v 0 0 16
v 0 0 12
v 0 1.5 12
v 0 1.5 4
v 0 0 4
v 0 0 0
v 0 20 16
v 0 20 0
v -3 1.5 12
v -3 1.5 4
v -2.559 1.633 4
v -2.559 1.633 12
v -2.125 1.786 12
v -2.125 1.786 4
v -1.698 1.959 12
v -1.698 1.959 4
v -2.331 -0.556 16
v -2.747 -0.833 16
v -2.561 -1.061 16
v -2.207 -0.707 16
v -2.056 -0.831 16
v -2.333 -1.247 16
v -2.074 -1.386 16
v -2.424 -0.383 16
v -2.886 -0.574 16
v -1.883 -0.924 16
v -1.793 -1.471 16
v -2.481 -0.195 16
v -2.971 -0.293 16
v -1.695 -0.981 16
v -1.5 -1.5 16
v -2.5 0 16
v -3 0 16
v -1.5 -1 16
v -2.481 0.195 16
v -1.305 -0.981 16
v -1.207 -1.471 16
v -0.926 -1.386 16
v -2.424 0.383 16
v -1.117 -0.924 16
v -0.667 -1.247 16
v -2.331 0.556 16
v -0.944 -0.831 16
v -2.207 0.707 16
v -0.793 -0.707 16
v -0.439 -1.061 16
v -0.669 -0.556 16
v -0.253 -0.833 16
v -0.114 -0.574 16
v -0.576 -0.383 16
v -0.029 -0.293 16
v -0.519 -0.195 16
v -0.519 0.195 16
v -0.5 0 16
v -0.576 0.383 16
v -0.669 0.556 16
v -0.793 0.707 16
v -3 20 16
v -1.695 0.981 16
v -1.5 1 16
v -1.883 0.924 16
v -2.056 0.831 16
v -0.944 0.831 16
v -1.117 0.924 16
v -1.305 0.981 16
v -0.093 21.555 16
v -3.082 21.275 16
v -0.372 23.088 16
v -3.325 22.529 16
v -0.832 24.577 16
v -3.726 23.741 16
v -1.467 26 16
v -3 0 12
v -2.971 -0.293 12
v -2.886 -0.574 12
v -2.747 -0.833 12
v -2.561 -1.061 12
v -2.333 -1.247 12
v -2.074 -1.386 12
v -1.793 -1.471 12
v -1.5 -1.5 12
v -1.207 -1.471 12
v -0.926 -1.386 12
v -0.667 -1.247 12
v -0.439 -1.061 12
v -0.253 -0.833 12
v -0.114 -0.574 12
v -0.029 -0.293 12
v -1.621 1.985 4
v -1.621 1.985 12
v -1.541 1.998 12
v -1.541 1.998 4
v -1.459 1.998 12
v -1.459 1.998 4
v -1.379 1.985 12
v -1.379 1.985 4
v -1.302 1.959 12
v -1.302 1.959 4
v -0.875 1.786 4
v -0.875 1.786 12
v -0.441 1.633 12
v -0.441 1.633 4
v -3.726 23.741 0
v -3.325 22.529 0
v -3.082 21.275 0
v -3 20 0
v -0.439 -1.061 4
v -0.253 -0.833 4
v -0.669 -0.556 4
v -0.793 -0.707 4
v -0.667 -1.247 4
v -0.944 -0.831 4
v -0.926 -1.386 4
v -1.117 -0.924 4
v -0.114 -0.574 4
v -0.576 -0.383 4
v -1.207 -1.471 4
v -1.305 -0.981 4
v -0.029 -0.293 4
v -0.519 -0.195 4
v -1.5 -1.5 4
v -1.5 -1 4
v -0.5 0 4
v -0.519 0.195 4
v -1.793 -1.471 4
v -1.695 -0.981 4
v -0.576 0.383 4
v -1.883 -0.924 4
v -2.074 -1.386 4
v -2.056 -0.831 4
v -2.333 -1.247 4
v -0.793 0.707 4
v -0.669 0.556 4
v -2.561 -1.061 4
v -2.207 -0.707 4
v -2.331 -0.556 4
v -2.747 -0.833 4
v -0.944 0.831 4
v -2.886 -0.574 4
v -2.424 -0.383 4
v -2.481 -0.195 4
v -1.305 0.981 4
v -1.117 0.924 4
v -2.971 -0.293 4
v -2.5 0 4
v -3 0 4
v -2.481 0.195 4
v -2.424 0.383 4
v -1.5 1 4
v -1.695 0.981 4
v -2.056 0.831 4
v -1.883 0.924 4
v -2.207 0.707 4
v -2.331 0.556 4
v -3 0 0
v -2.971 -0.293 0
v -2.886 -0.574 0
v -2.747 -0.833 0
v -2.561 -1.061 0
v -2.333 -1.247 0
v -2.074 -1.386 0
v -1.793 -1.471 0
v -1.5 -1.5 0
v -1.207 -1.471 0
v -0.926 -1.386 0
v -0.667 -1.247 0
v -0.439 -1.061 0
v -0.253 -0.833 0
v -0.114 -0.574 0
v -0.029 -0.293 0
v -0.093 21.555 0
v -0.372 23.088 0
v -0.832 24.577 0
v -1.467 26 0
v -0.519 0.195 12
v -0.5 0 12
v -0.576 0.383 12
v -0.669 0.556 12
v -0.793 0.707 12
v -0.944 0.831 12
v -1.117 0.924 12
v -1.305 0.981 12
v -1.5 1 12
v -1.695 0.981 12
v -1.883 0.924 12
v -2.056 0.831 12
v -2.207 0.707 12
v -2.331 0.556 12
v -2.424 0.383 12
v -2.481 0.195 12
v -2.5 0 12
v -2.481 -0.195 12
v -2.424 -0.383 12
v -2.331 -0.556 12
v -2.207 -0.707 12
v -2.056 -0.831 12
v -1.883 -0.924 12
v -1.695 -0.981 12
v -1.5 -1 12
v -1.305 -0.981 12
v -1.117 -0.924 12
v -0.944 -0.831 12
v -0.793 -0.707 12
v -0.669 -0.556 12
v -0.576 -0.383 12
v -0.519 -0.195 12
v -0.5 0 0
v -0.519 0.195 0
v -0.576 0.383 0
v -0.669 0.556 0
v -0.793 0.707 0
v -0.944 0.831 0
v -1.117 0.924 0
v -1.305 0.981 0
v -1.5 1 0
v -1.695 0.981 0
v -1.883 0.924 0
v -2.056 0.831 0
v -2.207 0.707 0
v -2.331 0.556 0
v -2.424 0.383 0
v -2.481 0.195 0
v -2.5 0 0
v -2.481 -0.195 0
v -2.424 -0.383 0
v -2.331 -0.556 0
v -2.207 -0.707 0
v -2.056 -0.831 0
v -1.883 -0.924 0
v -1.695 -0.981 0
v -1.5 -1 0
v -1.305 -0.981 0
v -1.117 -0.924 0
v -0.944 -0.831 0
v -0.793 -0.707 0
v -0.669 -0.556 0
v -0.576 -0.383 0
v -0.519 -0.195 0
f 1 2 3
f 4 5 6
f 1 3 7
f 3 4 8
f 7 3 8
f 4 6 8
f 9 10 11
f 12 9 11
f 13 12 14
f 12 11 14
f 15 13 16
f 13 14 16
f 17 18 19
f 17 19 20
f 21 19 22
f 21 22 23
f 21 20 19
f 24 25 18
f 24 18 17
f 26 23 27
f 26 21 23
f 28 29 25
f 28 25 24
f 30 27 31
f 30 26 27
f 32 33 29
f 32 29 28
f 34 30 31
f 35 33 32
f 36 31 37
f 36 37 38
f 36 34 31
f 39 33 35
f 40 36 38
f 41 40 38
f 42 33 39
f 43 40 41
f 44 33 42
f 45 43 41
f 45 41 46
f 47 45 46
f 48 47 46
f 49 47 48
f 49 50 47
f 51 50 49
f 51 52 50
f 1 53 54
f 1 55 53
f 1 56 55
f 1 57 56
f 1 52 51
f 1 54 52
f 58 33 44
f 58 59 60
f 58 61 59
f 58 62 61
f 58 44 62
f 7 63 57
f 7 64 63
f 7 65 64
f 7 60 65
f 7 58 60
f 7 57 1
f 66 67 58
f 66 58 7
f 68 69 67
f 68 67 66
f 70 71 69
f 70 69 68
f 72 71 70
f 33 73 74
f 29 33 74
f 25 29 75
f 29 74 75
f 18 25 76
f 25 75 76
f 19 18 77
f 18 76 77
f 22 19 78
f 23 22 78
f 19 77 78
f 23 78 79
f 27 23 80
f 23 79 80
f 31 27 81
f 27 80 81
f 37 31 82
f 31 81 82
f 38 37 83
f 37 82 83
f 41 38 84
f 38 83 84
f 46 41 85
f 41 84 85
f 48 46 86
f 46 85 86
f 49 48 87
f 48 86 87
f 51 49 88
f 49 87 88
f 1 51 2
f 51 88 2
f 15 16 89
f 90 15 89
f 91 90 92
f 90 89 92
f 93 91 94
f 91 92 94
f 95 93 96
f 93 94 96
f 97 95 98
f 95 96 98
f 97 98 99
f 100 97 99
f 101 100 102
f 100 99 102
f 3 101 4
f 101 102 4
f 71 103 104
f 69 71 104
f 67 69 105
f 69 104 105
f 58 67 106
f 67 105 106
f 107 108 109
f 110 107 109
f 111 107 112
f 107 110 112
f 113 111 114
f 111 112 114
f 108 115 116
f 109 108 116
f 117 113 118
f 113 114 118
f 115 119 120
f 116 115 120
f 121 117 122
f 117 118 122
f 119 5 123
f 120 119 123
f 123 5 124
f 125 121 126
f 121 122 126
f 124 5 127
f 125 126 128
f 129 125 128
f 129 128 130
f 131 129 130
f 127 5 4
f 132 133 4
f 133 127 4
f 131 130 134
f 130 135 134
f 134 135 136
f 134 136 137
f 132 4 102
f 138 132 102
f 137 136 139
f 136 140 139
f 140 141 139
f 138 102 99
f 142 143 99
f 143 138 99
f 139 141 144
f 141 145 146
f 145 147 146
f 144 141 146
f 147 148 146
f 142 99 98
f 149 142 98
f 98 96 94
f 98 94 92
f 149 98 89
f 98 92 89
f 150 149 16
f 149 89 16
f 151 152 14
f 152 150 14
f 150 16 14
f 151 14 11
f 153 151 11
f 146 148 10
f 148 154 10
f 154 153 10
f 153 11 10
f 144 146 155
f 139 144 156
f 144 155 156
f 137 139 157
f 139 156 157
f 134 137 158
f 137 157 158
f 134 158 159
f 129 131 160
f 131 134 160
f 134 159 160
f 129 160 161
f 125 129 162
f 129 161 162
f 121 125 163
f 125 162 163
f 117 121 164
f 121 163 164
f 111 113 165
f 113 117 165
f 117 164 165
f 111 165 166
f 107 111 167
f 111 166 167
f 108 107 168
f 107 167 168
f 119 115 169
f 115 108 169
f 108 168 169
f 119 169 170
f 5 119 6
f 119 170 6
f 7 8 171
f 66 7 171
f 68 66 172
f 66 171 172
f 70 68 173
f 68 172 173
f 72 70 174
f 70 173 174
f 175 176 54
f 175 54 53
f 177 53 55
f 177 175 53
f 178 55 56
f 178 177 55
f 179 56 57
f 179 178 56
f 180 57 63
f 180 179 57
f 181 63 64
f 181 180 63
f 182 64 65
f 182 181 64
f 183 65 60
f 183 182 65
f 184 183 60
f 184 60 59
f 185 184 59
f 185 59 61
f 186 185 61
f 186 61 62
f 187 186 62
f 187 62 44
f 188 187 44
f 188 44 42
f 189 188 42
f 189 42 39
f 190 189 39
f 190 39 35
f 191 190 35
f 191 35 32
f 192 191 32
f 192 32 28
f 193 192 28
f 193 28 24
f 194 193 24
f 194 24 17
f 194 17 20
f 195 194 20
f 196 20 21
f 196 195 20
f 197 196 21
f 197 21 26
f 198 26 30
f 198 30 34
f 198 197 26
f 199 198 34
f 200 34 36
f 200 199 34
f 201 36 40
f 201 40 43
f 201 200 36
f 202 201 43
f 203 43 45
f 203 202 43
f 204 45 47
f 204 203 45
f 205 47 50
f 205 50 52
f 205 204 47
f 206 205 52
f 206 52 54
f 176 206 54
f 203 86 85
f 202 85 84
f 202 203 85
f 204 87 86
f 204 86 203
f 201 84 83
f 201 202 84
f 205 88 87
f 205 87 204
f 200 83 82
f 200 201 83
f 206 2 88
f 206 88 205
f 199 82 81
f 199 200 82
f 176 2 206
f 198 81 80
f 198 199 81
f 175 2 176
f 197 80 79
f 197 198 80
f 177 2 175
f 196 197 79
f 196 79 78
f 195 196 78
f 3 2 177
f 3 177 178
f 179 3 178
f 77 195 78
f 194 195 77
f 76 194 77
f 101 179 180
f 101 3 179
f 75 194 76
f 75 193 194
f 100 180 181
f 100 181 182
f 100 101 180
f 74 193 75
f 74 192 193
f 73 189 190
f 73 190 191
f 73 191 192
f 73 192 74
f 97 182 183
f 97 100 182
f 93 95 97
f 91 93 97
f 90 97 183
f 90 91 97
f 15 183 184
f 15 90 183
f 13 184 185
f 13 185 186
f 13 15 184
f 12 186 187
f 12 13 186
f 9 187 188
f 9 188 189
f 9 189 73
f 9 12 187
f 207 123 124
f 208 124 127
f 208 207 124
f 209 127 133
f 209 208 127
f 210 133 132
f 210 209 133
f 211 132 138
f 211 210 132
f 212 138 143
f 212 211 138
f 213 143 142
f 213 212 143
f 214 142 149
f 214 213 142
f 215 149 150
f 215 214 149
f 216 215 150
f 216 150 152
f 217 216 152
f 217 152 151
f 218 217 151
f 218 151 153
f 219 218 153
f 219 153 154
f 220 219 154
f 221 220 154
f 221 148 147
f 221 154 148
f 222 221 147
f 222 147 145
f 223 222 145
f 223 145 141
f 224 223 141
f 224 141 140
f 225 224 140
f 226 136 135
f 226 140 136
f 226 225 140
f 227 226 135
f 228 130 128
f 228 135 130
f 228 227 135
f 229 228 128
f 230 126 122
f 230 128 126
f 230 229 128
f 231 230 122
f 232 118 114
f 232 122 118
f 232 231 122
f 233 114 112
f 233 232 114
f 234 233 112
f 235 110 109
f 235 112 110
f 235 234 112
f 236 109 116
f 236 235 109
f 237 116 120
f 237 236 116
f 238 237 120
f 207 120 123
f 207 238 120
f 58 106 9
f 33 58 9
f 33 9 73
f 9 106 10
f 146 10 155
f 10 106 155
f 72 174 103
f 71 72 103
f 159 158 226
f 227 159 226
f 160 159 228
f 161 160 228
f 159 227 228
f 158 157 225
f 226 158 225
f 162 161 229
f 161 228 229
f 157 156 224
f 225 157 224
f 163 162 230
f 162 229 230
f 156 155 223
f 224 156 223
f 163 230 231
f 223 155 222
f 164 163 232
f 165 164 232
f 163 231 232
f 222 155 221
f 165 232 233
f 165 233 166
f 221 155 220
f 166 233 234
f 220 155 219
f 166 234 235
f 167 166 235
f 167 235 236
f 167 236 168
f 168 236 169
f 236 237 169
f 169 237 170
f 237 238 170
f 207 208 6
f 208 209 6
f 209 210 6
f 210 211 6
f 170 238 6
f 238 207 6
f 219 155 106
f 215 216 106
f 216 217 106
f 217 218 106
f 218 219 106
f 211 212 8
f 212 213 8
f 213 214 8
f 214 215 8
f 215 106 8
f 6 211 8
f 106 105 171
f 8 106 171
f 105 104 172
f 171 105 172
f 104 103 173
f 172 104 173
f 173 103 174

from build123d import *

# Parameters (mm, degrees)
SKETCH1_R           = 1
BOSS_EXTRUDE1_DEPTH = 16
CUT_EXTRUDE1_START  = 8
SKETCH4_R           = 0.5
SKETCH4_R_2         = 1
CUT_EXTRUDE1_DEPTH  = 8
FILLET1_R           = 10


with BuildPart() as part:
    # Sketch1 → Boss-Extrude1 (new body)
    with BuildSketch(Plane.XY):
        with BuildLine():
            ThreePointArc((0, 20), (-0.37218717, 23.088420816), (-1.467437405, 26))
            Line((-1.467437405, 26), (-3.726208596, 23.741228809))
            ThreePointArc((-3.726208596, 23.741228809), (-3.183230826, 21.90552958), (-3, 20))
            Line((-3, 20), (-3, 0))
            ThreePointArc((-3, 0), (-1.5, -1.5), (0, 0))
            Line((0, 0), (0, 20))
        make_face()
        with Locations((-1.5, 0)):
            Circle(SKETCH1_R, mode=Mode.SUBTRACT)
    extrude(amount=BOSS_EXTRUDE1_DEPTH)

    # Sketch4 → Cut-Extrude1 (cut)
    # profile 1 of 10: a face of its own
    with BuildSketch(Plane(origin=(0, 0, 12), x_dir=(-1, 0, 0), z_dir=(0, 0, -1)).offset(CUT_EXTRUDE1_START)):
        with Locations((1.5, 1.5)):
            Circle(SKETCH4_R)
    # profile 2 of 10: a face of its own
    with BuildSketch(Plane(origin=(0, 0, 12), x_dir=(-1, 0, 0), z_dir=(0, 0, -1)).offset(CUT_EXTRUDE1_START)):
        with BuildLine():
            ThreePointArc((3, 0), (1.5, 1.5), (0, 0))
            ThreePointArc((0, 0), (1.5, -1.5), (3, 0))
        make_face()
        with Locations((1.5, 0)):
            Circle(SKETCH4_R_2, mode=Mode.SUBTRACT)
    # profile 3 of 10: a face of its own
    with BuildSketch(Plane(origin=(0, 0, 12), x_dir=(-1, 0, 0), z_dir=(0, 0, -1)).offset(CUT_EXTRUDE1_START)):
        with BuildLine():
            ThreePointArc((1.993006649, 1.416666667), (2.722601728, 0.869048338), (3, 0))
            Line((3, 0), (3, 1.5))
            Line((3, 1.5), (2, 1.5))
            ThreePointArc((2, 1.5), (1.998248595, 1.45818687), (1.993006649, 1.416666667))
        make_face()
    # profile 4 of 10: a face of its own
    with BuildSketch(Plane(origin=(0, 0, 12), x_dir=(-1, 0, 0), z_dir=(0, 0, -1)).offset(CUT_EXTRUDE1_START)):
        with BuildLine():
            ThreePointArc((1.5, 1.5), (1.25, 1.479019946), (1.006993351, 1.416666667))
            ThreePointArc((1.006993351, 1.416666667), (1.177251388, 1.118118692), (1.5, 1))
            ThreePointArc((1.5, 1), (1.822748612, 1.118118692), (1.993006649, 1.416666667))
            ThreePointArc((1.993006649, 1.416666667), (1.75, 1.479019946), (1.5, 1.5))
        make_face()
    # profile 5 of 10: a face of its own
    with BuildSketch(Plane(origin=(0, 0, 12), x_dir=(-1, 0, 0), z_dir=(0, 0, -1)).offset(CUT_EXTRUDE1_START)):
        with BuildLine():
            Line((0, 1.5), (0, 0))
            ThreePointArc((0, 0), (0.277398272, 0.869048338), (1.006993351, 1.416666667))
            ThreePointArc((1.006993351, 1.416666667), (1.001751405, 1.45818687), (1, 1.5))
            Line((1, 1.5), (0, 1.5))
        make_face()
    # profile 6 of 10: a face of its own
    with BuildSketch(Plane(origin=(0, 0, 12), x_dir=(-1, 0, 0), z_dir=(0, 0, -1)).offset(CUT_EXTRUDE1_START)):
        with BuildLine():
            ThreePointArc((1, 1.5), (1.001751405, 1.45818687), (1.006993351, 1.416666667))
            ThreePointArc((1.006993351, 1.416666667), (1.25, 1.479019946), (1.5, 1.5))
            Line((1.5, 1.5), (1, 1.5))
        make_face()
    # profile 7 of 10: a face of its own
    with BuildSketch(Plane(origin=(0, 0, 12), x_dir=(-1, 0, 0), z_dir=(0, 0, -1)).offset(CUT_EXTRUDE1_START)):
        with BuildLine():
            ThreePointArc((1.5, 1.5), (1.75, 1.479019946), (1.993006649, 1.416666667))
            ThreePointArc((1.993006649, 1.416666667), (1.998248595, 1.45818687), (2, 1.5))
            Line((2, 1.5), (1.5, 1.5))
        make_face()
    # profile 8 of 10: a face of its own
    with BuildSketch(Plane(origin=(0, 0, 12), x_dir=(-1, 0, 0), z_dir=(0, 0, -1)).offset(CUT_EXTRUDE1_START)):
        with BuildLine():
            ThreePointArc((2, 1.5), (1.5, 2), (1, 1.5))
            Line((1, 1.5), (1.5, 1.5))
            Line((1.5, 1.5), (2, 1.5))
        make_face()
    # profile 9 of 10: a face of its own
    with BuildSketch(Plane(origin=(0, 0, 12), x_dir=(-1, 0, 0), z_dir=(0, 0, -1)).offset(CUT_EXTRUDE1_START)):
        with BuildLine():
            ThreePointArc((1, 1.5), (1.001751405, 1.45818687), (1.006993351, 1.416666667))
            ThreePointArc((1.006993351, 1.416666667), (1.25, 1.479019946), (1.5, 1.5))
            Line((1.5, 1.5), (1, 1.5))
        make_face()
    # profile 10 of 10: a face of its own
    with BuildSketch(Plane(origin=(0, 0, 12), x_dir=(-1, 0, 0), z_dir=(0, 0, -1)).offset(CUT_EXTRUDE1_START)):
        with BuildLine():
            ThreePointArc((1.5, 1.5), (1.75, 1.479019946), (1.993006649, 1.416666667))
            ThreePointArc((1.993006649, 1.416666667), (1.998248595, 1.45818687), (2, 1.5))
            Line((2, 1.5), (1.5, 1.5))
        make_face()
    extrude(amount=-CUT_EXTRUDE1_DEPTH, mode=Mode.SUBTRACT)

    # Fillet1
    # the kernel refuses this fillet: 10 mm, written as the material it takes off along each edge
    with BuildSketch(Plane(origin=(-2, 1.5, 4), x_dir=(-1, 0, 0), z_dir=(0, 0, 1))) as fillet1_piece_1:
        with BuildLine():
            CenterArc((3.666666667, -9.637888197), FILLET1_R, 105.466009953, 7.913858162)
            Line((-0.301587302, -0.458947057), (-0.380952381, -0.275368234))
            ThreePointArc((-0.380952381, -0.275368234), (-0.249286732, -0.164750894), (-0.2, 0))
            Line((-0.2, 0), (0, 0.2))
            ThreePointArc((0, 0.2), (0.5, 0.2), (0.946666667, 0.192757764))
            Line((0.946666667, 0.192757764), (1, 0))
        make_face()
    extrude(amount=8, mode=Mode.SUBTRACT)
    with BuildSketch(Plane(origin=(-1, 1.5, 4), x_dir=(-0.5491696473652747, 0.8357108940373459, 0), z_dir=(0, 0, 1))) as fillet1_piece_2:
        with BuildLine():
            CenterArc((6.040866121, -8.35710894), FILLET1_R, 123.310065942, 7.913858162)
            Line((-0.549169647, -0.835710894), (-0.680970363, -0.685282933))
            ThreePointArc((-0.680970363, -0.685282933), (-0.441727002, -0.308021518), (-0.167142179, 0.109833929))
            Line((-0.167142179, 0.109833929), (0.109833929, 0.167142179))
            ThreePointArc((0.109833929, 0.167142179), (0.274584824, 0.117855447), (0.439335718, 0.167142179))
            Line((0.439335718, 0.167142179), (0.549169647, 0))
        make_face()
    extrude(amount=8, mode=Mode.SUBTRACT)


solid = part.part
